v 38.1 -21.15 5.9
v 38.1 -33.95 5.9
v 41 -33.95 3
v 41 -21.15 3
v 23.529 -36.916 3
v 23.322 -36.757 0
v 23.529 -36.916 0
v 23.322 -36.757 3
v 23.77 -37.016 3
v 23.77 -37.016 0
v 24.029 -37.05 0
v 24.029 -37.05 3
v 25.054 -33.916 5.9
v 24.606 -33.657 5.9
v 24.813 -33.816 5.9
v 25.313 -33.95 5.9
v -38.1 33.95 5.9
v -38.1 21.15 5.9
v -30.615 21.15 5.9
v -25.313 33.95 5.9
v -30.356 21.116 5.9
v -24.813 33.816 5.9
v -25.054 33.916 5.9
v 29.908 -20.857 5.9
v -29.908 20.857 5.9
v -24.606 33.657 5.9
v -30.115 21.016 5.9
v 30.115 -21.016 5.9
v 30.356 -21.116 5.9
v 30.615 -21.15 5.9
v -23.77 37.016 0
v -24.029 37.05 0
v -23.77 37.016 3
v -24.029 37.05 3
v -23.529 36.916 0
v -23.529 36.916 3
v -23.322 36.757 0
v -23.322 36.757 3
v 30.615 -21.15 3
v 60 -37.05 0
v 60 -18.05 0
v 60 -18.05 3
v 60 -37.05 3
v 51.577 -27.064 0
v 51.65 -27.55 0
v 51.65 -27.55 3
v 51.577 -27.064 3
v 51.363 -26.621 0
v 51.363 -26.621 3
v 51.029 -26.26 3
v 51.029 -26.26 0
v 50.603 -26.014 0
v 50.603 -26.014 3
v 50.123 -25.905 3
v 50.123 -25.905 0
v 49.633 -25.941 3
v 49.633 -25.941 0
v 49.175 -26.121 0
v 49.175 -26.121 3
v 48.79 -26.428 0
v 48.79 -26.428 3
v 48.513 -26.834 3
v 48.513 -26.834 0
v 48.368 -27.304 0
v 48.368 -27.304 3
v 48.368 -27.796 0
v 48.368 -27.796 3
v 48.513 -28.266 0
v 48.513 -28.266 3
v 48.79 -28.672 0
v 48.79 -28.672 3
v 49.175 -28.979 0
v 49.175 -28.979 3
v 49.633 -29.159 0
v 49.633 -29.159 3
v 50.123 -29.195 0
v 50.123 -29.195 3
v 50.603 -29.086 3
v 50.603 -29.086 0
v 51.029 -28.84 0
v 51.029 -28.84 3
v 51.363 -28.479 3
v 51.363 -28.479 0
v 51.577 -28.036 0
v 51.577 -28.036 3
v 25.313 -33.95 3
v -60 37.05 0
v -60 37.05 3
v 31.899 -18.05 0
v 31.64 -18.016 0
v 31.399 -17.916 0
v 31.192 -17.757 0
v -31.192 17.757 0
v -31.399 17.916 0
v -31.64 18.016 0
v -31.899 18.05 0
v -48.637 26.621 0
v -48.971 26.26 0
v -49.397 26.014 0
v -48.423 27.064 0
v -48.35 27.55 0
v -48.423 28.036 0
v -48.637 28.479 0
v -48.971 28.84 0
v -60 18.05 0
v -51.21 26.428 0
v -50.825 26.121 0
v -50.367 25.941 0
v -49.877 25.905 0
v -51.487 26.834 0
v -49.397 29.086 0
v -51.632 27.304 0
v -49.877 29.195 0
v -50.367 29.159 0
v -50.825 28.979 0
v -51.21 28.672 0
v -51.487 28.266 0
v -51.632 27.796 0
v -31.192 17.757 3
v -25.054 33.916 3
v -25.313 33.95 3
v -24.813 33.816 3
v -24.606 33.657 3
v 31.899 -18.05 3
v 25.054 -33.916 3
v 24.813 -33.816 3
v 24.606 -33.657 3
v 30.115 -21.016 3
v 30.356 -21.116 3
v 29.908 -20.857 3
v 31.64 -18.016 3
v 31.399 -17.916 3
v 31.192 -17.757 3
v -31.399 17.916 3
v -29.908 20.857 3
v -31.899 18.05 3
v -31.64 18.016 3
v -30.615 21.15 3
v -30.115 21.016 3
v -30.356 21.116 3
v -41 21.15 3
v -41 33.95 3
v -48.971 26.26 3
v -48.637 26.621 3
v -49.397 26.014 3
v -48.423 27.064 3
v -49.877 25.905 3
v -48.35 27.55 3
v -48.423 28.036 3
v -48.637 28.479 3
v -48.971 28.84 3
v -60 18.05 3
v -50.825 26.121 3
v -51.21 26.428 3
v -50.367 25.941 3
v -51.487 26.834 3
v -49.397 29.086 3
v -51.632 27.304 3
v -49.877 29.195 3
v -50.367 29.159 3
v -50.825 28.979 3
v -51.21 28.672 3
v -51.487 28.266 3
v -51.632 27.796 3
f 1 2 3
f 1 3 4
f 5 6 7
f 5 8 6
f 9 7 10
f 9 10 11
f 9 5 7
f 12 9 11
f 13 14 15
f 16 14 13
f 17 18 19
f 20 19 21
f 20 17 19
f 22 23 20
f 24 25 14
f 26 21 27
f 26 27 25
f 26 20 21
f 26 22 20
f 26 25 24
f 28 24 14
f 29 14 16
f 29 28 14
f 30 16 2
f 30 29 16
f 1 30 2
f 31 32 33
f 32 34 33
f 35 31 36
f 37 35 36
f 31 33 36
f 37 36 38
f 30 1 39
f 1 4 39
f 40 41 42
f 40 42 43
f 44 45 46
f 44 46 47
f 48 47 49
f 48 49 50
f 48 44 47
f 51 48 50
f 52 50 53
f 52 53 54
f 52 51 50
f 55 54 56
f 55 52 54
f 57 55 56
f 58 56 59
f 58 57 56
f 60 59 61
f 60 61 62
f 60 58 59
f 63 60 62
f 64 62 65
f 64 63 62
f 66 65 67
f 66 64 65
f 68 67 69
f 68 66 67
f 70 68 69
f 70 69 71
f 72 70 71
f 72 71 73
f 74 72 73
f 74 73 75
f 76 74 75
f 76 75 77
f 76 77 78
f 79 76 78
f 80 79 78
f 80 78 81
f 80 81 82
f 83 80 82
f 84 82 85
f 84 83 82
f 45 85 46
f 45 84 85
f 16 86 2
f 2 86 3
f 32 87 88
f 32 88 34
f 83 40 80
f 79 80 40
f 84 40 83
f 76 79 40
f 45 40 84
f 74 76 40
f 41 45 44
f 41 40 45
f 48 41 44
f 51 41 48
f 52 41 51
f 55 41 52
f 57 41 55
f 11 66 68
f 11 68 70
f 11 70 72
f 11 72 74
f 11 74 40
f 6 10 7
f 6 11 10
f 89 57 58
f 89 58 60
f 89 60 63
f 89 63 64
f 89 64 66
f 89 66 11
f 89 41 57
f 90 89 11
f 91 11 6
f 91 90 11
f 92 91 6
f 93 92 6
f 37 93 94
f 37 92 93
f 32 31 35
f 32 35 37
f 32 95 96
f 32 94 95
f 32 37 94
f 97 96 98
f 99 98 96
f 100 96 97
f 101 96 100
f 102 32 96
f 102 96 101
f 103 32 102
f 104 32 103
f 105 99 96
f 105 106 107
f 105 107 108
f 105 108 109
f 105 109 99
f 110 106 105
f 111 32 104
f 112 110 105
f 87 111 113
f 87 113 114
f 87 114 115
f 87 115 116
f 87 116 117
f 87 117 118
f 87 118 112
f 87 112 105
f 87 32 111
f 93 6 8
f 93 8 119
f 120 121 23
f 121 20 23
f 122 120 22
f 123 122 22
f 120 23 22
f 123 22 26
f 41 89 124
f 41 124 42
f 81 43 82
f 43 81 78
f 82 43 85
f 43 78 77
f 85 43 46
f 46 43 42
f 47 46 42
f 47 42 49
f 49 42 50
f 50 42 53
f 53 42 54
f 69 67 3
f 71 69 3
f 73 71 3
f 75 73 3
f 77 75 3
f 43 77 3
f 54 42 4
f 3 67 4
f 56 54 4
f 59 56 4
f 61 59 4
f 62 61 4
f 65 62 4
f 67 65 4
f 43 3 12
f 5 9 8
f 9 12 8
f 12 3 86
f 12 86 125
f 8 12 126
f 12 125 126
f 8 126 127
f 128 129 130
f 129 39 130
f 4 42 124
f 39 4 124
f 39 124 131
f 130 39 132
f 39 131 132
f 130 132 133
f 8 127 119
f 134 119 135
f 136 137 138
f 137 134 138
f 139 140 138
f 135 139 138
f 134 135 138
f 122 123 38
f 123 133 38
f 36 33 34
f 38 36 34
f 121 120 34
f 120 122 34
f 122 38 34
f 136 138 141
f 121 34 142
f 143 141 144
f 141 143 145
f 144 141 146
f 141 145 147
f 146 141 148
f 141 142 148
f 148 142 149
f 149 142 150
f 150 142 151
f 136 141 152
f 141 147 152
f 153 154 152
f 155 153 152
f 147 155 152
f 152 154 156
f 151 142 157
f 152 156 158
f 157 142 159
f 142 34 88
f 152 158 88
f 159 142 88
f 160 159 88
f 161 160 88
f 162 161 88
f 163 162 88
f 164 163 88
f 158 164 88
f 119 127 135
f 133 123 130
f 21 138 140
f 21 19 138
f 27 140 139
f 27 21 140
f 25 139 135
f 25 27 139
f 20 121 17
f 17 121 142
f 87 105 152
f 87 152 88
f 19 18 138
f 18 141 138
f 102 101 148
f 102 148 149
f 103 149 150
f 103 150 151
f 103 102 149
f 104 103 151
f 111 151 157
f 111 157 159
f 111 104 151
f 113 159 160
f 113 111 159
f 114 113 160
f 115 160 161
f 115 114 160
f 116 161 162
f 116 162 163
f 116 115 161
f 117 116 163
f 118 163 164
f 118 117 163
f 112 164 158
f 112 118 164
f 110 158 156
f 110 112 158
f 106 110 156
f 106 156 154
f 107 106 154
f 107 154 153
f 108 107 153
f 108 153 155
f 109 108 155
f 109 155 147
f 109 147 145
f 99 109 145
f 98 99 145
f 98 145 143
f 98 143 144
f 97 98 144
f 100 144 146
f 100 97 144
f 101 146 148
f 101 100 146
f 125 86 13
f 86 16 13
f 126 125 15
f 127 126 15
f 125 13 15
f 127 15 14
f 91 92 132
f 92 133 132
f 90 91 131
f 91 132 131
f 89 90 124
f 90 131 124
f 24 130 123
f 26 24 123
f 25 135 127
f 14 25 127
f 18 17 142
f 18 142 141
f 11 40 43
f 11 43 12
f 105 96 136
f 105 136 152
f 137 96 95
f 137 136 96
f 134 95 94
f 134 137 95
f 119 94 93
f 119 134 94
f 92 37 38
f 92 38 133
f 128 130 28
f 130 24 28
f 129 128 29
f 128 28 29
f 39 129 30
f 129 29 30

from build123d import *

# Parameters (mm, degrees)
SKETCH_1_R      = 1.65
EXTRUDE_1_DEPTH = 3
EXTRUDE_2_DEPTH = 2.9
CHAMFER_1_SIZE  = 2.9
FILLET_1_R      = 1


with BuildPart() as part:
    # 草图1 → 凸台-拉伸1 (new body)
    with BuildSketch(Plane.XY):
        Polygon((-60, 37.05), (-23.614971157, 37.05), (31.485028843, -18.05), (60, -18.05), (60, -37.05), (23.614971157, -37.05), (-31.485028843, 18.05), (-60, 18.05), align=None)
        with Locations((-50, 27.55)):
            Circle(SKETCH_1_R, mode=Mode.SUBTRACT)
        with Locations((50, -27.55)):
            Circle(SKETCH_1_R, mode=Mode.SUBTRACT)
    extrude(amount=EXTRUDE_1_DEPTH)

    # 草图2 → 凸台-拉伸2 (add)
    with BuildSketch(Plane.XY.offset(3)):
        Polygon((-41, 33.95), (-41, 21.15), (-30.200966799, 21.15), (24.899033201, -33.95), (41, -33.95), (41, -21.15), (30.200966799, -21.15), (-24.899033201, 33.95), align=None)
    extrude(amount=EXTRUDE_2_DEPTH)

    # 倒角1
    chamfer_1_edges = [part.edges().sort_by_distance(p)[0] for p in [
        (41, -27.55, 5.9),
        (-41, 27.55, 5.9),
    ]]
    chamfer(chamfer_1_edges, length=CHAMFER_1_SIZE - 0.0001)  # a hair under: the kernel refuses the full size

    # 圆角1
    fillet_1_edges = [part.edges().sort_by_distance(p)[0] for p in [
        (-23.614971157, 37.05, 1.5),
        (31.485028843, -18.05, 1.5),
        (23.614971157, -37.05, 1.5),
        (-31.485028843, 18.05, 1.5),
        (-24.899033201, 33.95, 4.45),
        (-30.200966799, 21.15, 4.45),
        (24.899033201, -33.95, 4.45),
        (30.200966799, -21.15, 4.45),
    ]]
    fillet(fillet_1_edges, radius=FILLET_1_R)


solid = part.part
